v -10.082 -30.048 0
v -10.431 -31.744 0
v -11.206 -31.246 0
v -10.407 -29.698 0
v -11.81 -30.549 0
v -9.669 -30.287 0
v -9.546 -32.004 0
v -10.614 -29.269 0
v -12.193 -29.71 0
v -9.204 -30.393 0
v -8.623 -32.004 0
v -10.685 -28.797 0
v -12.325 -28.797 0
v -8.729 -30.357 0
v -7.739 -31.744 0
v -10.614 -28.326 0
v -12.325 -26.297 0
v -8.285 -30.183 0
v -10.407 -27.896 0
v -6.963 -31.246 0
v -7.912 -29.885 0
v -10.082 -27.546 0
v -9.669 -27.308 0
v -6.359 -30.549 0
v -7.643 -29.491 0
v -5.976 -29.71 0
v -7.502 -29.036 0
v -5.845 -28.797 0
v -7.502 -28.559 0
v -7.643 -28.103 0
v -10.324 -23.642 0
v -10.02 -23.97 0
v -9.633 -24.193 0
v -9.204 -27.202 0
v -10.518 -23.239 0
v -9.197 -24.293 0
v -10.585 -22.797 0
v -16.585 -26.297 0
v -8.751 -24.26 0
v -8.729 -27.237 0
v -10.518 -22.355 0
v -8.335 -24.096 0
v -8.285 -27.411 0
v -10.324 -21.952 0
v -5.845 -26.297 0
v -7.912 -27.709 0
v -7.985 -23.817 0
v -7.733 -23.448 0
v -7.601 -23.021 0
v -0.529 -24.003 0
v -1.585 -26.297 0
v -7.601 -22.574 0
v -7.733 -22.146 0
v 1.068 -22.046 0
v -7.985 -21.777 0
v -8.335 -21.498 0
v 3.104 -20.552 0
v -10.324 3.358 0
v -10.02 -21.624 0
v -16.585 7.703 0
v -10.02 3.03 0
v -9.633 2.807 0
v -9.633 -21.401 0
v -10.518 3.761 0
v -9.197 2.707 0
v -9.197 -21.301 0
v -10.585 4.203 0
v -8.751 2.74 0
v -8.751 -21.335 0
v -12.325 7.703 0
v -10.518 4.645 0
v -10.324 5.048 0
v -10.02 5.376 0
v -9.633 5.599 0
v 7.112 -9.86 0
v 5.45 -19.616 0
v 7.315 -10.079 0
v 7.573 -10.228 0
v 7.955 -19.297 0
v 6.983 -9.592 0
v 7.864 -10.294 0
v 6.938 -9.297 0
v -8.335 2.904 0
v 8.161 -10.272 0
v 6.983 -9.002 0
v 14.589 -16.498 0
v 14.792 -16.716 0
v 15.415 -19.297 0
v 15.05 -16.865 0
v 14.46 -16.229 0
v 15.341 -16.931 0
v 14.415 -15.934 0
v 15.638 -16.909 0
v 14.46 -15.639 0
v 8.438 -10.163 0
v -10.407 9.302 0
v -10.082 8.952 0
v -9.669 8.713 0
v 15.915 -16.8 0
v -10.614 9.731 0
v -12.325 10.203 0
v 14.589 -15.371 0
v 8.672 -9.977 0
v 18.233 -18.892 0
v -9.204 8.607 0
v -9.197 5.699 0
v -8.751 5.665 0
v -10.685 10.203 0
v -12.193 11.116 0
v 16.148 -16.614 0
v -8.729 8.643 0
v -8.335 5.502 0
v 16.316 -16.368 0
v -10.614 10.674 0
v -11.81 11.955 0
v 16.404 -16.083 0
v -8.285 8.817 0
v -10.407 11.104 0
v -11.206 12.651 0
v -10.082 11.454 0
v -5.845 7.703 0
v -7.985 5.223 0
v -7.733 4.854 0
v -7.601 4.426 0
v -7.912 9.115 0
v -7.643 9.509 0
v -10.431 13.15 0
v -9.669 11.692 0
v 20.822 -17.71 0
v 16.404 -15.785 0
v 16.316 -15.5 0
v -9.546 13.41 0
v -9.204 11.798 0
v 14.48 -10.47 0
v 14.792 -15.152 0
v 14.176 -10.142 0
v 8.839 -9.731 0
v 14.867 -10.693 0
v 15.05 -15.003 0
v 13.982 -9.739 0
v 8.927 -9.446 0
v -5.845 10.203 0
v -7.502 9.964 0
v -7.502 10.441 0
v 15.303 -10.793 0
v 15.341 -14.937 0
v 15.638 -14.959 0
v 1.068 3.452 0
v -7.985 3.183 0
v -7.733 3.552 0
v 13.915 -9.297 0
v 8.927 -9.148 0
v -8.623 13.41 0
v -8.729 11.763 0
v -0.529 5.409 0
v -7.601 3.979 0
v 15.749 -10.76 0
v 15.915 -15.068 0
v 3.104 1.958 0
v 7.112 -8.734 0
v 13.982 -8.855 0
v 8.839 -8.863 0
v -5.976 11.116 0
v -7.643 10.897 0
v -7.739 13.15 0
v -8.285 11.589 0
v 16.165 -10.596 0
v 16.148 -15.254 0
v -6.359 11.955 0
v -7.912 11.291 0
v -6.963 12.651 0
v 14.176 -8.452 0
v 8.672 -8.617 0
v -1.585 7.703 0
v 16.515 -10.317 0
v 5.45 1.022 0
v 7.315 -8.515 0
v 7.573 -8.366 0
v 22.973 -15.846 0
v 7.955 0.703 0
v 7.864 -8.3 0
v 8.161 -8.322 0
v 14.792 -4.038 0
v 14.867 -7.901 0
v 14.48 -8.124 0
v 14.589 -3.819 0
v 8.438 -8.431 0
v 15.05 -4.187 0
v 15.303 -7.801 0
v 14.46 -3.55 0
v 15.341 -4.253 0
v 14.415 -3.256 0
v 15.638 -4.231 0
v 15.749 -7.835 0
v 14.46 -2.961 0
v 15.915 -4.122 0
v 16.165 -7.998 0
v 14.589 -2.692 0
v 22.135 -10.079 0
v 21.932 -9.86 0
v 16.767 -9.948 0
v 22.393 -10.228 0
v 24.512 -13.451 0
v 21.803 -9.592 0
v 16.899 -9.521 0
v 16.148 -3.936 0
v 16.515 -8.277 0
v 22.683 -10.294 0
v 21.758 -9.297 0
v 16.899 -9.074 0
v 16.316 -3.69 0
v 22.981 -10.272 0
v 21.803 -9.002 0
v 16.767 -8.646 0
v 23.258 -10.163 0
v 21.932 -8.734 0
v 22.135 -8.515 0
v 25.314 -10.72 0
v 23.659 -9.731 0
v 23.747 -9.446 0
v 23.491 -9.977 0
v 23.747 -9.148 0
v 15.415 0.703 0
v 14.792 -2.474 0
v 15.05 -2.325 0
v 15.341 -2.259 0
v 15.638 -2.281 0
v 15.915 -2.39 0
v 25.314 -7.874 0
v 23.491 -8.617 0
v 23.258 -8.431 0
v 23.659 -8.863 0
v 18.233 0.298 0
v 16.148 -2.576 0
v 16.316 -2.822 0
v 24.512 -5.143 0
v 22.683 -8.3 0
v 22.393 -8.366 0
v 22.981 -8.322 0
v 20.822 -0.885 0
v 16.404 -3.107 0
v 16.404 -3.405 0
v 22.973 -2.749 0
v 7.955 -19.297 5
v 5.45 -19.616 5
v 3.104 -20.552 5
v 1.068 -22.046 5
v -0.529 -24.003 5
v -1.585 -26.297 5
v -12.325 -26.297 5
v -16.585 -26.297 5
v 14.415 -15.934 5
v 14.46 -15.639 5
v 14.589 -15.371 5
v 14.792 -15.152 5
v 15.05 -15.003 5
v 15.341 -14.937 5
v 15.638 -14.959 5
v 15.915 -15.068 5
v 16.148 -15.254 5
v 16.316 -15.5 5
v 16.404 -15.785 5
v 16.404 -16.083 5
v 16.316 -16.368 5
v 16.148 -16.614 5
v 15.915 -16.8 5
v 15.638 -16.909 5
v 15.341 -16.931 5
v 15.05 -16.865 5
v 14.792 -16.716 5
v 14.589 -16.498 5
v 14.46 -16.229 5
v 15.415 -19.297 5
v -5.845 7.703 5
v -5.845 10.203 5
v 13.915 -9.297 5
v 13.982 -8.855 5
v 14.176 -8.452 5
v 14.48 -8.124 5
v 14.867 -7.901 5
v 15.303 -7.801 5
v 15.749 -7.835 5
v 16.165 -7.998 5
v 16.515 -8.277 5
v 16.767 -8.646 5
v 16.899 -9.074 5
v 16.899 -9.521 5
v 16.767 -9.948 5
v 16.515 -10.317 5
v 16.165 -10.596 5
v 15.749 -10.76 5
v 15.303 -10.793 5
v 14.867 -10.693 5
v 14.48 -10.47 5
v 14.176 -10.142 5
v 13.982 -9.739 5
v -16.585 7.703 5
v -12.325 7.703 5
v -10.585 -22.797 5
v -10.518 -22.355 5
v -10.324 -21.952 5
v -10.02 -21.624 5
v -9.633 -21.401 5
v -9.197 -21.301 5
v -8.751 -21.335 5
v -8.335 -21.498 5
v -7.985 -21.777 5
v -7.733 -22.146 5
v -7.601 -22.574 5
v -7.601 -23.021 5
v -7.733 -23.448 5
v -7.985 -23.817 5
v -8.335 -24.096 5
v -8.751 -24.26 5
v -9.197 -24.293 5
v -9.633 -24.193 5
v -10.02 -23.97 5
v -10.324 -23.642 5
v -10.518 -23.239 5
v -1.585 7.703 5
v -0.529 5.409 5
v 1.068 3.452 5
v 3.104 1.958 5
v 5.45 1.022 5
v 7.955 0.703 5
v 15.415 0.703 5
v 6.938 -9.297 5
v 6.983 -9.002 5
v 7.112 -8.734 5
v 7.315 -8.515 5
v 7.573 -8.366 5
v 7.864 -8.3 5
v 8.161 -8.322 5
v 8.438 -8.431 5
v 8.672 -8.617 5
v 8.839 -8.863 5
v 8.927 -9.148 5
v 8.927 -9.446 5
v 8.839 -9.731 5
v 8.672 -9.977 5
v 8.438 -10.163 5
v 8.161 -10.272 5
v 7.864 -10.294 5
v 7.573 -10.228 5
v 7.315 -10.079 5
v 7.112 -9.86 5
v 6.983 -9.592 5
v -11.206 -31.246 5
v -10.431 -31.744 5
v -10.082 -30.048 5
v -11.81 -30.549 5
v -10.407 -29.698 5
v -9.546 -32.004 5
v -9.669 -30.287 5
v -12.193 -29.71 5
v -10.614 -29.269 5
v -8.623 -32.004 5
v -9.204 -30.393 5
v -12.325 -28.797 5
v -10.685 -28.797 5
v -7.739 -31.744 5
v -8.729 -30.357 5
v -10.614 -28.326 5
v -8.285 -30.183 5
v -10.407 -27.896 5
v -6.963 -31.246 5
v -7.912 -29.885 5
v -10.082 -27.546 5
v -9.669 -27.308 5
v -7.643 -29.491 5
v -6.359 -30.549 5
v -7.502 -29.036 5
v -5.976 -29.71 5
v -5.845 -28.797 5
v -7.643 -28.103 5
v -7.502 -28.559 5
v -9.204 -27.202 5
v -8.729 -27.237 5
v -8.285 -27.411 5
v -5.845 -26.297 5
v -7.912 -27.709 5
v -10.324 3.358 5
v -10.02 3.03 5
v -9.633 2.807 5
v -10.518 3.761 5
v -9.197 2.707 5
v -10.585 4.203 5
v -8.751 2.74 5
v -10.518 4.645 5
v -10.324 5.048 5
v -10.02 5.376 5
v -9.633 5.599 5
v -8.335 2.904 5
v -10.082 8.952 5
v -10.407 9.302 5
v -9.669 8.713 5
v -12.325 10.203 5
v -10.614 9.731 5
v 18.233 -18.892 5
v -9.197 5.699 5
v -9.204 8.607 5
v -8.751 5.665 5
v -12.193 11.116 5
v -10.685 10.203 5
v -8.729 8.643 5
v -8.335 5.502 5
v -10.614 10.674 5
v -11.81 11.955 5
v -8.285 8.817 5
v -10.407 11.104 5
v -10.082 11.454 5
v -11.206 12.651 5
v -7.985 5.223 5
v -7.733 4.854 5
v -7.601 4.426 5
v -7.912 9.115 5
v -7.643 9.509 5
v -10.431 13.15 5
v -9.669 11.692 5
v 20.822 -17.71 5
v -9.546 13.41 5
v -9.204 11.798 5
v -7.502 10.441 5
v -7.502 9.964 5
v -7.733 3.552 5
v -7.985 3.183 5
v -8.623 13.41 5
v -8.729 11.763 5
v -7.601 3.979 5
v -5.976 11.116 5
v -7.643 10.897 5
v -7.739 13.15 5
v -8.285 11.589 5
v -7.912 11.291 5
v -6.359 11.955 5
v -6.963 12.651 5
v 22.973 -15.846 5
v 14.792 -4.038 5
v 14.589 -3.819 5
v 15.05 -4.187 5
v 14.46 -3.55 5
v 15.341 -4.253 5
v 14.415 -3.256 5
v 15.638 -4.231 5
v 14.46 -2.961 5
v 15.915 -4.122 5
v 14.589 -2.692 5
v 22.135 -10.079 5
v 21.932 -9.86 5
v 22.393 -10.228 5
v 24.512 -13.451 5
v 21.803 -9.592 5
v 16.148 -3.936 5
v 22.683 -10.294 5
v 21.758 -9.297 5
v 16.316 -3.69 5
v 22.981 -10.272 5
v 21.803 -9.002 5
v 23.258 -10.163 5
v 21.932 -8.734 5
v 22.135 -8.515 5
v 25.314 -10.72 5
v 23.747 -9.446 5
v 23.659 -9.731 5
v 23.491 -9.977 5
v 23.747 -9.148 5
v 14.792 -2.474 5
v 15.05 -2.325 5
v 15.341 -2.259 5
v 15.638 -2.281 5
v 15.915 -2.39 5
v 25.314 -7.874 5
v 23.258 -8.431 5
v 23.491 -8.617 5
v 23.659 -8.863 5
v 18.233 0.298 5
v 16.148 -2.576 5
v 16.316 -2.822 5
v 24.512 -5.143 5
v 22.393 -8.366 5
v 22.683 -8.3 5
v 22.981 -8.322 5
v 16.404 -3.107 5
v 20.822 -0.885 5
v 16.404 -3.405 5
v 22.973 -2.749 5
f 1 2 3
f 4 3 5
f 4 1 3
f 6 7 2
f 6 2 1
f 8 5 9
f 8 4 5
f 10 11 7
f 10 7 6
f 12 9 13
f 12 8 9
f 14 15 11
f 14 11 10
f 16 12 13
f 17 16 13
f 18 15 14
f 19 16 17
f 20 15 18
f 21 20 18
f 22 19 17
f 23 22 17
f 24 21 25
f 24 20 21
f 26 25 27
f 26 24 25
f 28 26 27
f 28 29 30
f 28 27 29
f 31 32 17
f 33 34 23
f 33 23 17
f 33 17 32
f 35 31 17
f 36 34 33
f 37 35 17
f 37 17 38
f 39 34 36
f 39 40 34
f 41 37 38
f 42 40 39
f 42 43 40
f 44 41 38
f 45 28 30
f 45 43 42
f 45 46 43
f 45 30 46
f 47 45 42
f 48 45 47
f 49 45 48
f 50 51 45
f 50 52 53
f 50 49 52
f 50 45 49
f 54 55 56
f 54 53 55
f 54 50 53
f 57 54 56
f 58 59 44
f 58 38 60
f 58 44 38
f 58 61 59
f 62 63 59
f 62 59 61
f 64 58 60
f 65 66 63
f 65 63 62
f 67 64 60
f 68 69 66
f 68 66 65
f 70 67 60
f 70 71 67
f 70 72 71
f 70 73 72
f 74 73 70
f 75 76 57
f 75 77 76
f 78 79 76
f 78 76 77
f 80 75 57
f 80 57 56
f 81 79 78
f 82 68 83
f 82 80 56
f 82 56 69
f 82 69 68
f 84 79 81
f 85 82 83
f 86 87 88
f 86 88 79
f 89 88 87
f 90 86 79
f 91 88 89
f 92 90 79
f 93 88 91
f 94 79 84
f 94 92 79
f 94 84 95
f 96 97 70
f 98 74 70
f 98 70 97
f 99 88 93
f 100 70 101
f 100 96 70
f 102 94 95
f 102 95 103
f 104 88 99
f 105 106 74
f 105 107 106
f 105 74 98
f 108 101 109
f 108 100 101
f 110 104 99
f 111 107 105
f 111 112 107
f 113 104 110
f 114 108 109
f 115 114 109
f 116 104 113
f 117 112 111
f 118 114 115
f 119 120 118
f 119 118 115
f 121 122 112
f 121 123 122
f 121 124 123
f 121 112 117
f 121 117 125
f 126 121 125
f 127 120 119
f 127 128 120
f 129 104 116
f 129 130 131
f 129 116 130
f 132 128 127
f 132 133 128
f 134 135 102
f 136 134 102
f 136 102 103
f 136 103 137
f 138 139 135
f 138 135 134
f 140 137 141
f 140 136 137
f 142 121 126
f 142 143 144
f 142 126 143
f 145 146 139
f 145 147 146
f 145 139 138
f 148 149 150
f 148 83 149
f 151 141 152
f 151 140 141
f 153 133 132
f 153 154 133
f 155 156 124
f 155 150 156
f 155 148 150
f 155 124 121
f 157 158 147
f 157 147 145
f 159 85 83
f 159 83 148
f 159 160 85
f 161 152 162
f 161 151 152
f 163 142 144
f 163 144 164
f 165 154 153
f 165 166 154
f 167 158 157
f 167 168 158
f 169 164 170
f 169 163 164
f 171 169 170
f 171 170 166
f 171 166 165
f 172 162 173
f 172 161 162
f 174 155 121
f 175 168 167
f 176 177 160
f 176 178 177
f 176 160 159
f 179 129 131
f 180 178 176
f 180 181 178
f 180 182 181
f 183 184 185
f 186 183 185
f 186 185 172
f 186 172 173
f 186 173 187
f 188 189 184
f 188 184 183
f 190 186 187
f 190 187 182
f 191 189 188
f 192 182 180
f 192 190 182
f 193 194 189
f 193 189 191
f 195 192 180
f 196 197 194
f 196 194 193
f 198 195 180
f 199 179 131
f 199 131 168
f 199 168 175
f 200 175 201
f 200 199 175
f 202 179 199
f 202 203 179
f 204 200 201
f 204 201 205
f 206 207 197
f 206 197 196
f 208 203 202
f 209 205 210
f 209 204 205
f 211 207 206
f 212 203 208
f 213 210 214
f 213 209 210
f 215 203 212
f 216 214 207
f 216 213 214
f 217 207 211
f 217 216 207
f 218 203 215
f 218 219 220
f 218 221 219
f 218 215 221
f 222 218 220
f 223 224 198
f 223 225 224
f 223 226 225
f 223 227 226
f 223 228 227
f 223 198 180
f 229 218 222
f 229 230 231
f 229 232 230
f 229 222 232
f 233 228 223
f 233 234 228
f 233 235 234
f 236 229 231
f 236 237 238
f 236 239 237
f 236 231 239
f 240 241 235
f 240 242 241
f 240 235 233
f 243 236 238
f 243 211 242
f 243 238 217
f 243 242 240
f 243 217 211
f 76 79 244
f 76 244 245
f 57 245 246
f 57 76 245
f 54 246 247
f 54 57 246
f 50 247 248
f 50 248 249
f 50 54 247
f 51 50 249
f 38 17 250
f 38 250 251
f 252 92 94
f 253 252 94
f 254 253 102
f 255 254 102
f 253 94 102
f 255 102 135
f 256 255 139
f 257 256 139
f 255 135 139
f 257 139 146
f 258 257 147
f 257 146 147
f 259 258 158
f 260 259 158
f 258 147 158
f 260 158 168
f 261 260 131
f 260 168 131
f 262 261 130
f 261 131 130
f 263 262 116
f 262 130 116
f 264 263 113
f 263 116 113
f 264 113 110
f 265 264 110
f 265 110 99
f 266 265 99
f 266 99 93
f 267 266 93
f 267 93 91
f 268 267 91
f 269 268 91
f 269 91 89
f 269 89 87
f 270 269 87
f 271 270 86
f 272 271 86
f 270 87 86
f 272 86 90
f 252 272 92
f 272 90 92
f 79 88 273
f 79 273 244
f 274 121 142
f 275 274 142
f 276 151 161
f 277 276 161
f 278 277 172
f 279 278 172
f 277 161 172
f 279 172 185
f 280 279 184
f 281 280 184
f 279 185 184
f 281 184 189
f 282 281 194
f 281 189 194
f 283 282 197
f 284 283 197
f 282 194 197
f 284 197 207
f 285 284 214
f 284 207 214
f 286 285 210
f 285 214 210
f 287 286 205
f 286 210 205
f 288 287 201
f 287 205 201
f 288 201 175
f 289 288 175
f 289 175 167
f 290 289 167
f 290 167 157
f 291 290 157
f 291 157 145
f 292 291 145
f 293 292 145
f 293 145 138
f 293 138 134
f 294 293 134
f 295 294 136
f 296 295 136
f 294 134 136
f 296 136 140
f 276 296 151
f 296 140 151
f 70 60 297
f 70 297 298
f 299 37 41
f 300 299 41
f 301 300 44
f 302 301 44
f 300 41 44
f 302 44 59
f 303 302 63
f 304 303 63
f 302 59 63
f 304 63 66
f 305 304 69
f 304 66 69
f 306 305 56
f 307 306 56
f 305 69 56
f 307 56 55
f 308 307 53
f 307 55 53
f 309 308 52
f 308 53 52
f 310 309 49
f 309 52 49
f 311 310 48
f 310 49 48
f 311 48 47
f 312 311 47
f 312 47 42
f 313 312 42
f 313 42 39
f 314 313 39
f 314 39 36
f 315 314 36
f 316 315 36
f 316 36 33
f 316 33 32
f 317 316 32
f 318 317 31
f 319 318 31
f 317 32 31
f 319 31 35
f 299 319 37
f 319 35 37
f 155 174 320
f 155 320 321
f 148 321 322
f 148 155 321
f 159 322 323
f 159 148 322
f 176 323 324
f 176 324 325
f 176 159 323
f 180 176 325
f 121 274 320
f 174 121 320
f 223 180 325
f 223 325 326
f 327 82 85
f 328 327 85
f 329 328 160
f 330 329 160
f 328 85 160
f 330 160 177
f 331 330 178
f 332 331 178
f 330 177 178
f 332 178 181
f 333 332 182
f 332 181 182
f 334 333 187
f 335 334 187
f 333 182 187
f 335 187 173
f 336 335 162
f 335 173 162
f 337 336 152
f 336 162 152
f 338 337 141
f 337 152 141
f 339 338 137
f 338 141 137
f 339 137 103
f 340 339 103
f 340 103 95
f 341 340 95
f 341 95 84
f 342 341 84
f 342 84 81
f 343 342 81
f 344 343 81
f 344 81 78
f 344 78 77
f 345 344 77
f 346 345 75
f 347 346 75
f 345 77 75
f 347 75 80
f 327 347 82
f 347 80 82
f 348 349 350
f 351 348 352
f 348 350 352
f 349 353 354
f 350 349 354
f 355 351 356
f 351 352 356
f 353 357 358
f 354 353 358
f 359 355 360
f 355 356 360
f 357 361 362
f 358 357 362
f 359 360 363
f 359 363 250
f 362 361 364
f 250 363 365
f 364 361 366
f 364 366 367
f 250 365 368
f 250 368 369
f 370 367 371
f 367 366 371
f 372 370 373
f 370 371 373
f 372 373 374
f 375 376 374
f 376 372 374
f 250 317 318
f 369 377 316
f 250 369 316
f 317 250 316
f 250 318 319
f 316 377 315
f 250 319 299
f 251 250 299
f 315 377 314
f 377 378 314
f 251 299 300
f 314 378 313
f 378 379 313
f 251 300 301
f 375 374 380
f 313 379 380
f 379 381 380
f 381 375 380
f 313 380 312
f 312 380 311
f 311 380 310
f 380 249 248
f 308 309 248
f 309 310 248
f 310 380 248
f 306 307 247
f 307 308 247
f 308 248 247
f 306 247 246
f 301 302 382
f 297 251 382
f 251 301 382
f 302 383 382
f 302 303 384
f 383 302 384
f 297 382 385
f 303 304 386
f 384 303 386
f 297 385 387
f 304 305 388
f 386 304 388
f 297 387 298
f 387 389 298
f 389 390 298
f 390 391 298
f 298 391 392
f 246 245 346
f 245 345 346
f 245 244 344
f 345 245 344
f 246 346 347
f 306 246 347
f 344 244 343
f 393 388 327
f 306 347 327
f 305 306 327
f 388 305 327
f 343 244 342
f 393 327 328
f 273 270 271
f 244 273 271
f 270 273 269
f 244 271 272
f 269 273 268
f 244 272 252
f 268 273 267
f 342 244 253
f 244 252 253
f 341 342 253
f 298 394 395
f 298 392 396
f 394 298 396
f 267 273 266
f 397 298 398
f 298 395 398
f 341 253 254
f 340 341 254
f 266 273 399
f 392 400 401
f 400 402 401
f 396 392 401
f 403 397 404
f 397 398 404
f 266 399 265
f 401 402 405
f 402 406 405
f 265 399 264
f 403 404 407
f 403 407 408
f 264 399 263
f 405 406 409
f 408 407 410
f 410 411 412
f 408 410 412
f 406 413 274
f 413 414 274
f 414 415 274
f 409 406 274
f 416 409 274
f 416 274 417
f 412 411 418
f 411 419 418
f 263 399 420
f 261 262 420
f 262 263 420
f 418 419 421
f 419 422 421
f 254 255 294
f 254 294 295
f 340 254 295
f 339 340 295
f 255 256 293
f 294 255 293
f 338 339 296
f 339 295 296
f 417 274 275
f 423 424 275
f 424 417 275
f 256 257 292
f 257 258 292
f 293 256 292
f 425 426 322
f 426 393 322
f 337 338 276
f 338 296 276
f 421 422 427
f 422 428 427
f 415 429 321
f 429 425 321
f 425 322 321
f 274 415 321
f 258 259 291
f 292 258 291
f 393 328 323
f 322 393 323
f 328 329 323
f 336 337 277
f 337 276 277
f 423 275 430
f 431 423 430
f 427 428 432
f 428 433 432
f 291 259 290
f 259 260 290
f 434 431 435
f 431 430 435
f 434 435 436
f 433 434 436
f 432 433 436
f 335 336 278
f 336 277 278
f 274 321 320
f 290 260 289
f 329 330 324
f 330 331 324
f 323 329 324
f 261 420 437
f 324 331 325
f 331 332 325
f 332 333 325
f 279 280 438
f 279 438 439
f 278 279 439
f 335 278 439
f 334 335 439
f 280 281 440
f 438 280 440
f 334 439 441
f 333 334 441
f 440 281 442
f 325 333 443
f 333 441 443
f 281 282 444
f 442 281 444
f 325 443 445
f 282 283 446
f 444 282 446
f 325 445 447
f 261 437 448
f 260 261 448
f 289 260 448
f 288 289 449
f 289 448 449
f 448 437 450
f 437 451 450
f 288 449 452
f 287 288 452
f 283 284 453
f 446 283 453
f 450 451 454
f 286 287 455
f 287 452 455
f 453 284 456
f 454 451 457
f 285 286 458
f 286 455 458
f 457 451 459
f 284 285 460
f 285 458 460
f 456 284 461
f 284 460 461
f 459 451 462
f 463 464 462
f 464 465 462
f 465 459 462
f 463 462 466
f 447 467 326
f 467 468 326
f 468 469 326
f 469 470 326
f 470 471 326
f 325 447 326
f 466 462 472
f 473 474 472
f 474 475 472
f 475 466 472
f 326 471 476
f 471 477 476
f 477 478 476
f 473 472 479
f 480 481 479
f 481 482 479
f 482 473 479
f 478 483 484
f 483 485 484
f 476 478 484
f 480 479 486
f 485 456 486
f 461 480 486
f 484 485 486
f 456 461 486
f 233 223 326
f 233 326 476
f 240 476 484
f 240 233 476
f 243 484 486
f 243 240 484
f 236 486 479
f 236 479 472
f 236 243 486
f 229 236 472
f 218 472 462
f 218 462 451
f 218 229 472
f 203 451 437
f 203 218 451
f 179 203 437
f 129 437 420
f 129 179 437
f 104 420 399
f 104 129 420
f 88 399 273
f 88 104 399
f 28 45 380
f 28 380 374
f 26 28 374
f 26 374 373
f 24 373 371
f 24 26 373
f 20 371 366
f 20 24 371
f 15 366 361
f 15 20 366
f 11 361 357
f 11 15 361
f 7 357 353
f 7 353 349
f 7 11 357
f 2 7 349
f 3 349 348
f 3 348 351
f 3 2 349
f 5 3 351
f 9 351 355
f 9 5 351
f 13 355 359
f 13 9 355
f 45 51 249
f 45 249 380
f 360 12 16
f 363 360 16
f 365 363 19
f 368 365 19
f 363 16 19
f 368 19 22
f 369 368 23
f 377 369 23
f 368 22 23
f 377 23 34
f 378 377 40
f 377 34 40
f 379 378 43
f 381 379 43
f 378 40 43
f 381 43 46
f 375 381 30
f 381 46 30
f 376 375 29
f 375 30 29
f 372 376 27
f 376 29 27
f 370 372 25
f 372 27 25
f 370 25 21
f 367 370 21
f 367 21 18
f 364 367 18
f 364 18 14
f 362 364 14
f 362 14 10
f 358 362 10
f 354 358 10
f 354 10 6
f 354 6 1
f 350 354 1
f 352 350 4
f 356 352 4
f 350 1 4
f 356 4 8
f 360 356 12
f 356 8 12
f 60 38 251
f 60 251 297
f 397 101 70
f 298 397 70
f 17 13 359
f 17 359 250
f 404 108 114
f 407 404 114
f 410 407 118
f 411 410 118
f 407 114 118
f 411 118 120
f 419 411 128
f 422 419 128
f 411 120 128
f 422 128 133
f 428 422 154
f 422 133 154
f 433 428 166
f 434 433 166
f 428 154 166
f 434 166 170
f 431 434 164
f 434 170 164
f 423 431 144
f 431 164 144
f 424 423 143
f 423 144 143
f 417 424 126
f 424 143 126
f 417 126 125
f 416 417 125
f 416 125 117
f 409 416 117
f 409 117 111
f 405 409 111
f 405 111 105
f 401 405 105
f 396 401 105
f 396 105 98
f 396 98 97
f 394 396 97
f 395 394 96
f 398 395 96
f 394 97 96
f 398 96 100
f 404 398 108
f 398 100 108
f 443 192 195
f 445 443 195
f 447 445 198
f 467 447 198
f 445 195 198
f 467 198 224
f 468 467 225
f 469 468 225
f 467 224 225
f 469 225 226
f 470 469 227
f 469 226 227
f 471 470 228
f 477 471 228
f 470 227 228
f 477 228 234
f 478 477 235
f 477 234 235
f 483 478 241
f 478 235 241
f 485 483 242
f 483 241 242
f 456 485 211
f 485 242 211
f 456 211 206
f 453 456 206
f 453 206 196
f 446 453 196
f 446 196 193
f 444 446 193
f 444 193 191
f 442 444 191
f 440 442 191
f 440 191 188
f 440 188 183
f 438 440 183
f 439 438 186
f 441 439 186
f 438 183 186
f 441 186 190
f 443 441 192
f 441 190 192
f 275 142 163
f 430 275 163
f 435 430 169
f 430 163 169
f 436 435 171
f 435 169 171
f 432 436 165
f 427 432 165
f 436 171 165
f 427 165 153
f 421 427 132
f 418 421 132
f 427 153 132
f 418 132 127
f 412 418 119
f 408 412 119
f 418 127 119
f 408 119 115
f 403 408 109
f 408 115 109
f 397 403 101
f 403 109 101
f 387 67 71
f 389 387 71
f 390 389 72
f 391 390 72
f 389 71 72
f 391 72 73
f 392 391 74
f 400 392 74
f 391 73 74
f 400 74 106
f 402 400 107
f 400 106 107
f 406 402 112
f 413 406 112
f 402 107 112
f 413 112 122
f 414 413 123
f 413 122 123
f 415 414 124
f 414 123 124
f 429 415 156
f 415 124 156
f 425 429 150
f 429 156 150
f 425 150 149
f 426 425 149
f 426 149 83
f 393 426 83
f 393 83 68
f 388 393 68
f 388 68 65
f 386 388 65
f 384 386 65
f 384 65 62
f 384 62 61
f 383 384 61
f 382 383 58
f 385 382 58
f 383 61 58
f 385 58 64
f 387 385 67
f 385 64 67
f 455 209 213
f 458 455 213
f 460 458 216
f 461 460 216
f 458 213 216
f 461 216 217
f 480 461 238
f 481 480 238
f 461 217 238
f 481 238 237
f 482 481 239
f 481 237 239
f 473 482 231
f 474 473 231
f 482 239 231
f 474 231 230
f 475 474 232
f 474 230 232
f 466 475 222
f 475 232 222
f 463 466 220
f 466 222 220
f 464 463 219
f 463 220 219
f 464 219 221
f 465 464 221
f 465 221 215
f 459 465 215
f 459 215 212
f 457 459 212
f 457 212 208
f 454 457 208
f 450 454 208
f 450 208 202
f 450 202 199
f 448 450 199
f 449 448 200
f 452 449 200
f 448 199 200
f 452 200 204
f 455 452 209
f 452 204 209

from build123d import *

# Parameters (mm, degrees)
ESQUISSE1_R             = 1
ESQUISSE1_R_2           = 1.5
BOSS_EXTRU_1_DEPTH      = 5
ENL_V_MAT_EXTRU_1_DEPTH = 5
ESQUISSE3_W             = 20
ESQUISSE3_H             = 34
BOSS_EXTRU_2_DEPTH      = 5
ESQUISSE4_R             = 1.5
ESQUISSE4_W             = 9.798464728
ESQUISSE4_H             = 39.858161606
ENL_V_MAT_EXTRU_2_DEPTH = 5
ESQUISSE5_W             = 2.5
ESQUISSE5_H             = 34
BOSS_EXTRU_3_DEPTH      = 5
ESQUISSE6_R             = 1.6
BOSS_EXTRU_4_DEPTH      = 5
ESQUISSE8_W             = 43.131619687
ESQUISSE8_H             = 48.78573065
ESQUISSE8_W_2           = 13.204377845
ESQUISSE8_H_2           = 47.447309867
ENL_V_MAT_EXTRU_3_DEPTH = 10
ESQUISSE9_R             = 1.5
ESQUISSE9_R_2           = 1
BOSS_EXTRU_5_DEPTH      = 5
CONG_1_R                = 10


with BuildPart() as part:
    # Esquisse1 → Boss.-Extru.1 (new body)
    with BuildSketch(Plane.XY):
        with BuildLine():
            Line((-13.584596858, -30.047129187), (-13.584596858, -25.547129187))
            Line((-13.584596858, -25.547129187), (-13.584596858, -25.297129187))
            Line((-13.584596858, -25.297129187), (-13.834596858, -25.297129187))
            Line((-13.834596858, -25.297129187), (-16.334596858, -25.297129187))
            Line((-16.334596858, -25.297129187), (-16.584596858, -25.297129187))
            Line((-16.584596858, -25.297129187), (-16.584596858, -25.047129187))
            Line((-16.584596858, -25.047129187), (-16.584596858, 6.452870813))
            Line((-16.584596858, 6.452870813), (-16.584596858, 6.702870813))
            Line((-16.584596858, 6.702870813), (-16.334596858, 6.702870813))
            Line((-16.334596858, 6.702870813), (-13.834596858, 6.702870813))
            Line((-13.834596858, 6.702870813), (-13.584596858, 6.702870813))
            Line((-13.584596858, 6.702870813), (-13.584596858, 6.952870813))
            Line((-13.584596858, 6.952870813), (-13.584596858, 11.452870813))
            Line((-13.584596858, 11.452870813), (-13.584596858, 11.702870813))
            Line((-13.584596858, 11.702870813), (-13.334596858, 11.702870813))
            Line((-13.334596858, 11.702870813), (-8.584596858, 11.702870813))
            Line((-8.584596858, 11.702870813), (-8.584596858, 6.702870813))
            Line((-8.584596858, 6.702870813), (-7.491776281, 6.702870813))
            Line((-7.491776281, 6.702870813), (-4.034541178, 6.702870813))
            ThreePointArc((-4.034541178, 6.702870813), (-0.161557832, 6.19424756), (3.448773595, 4.702870813))
            ThreePointArc((3.448773595, 4.702870813), (10.66943645, 1.720117321), (18.415403142, 0.702870813))
            ThreePointArc((18.415403142, 0.702870813), (28.415403142, -9.297129187), (18.415403142, -19.297129187))
            ThreePointArc((18.415403142, -19.297129187), (10.66943645, -20.314375694), (3.448773595, -23.297129187))
            ThreePointArc((3.448773595, -23.297129187), (-0.161557832, -24.788505933), (-4.034541178, -25.297129187))
            Line((-4.034541178, -25.297129187), (-7.491776281, -25.297129187))
            Line((-7.491776281, -25.297129187), (-8.584596858, -25.297129187))
            Line((-8.584596858, -25.297129187), (-8.584596858, -30.297129187))
            Line((-8.584596858, -30.297129187), (-13.334596858, -30.297129187))
            Line((-13.334596858, -30.297129187), (-13.584596858, -30.297129187))
            Line((-13.584596858, -30.297129187), (-13.584596858, -30.047129187))
        make_face()
        with Locations((18.477857718, -2.297129187)):
            Circle(ESQUISSE1_R, mode=Mode.SUBTRACT)
        with Locations((25.415403142, -9.359583762)):
            Circle(ESQUISSE1_R, mode=Mode.SUBTRACT)
        with Locations((18.415403142, -9.297129187)):
            Circle(ESQUISSE1_R_2, mode=Mode.SUBTRACT)
        with Locations((11.415403142, -9.234674611)):
            Circle(ESQUISSE1_R, mode=Mode.SUBTRACT)
        with Locations((18.352948567, -16.297129187)):
            Circle(ESQUISSE1_R, mode=Mode.SUBTRACT)
    extrude(amount=BOSS_EXTRU_1_DEPTH)

    # Esquisse2 → Enlèv. mat.-Extru.1 (cut)
    with BuildSketch(Plane(origin=(0, 0, 0), x_dir=(-1, 0, 0), z_dir=(0, 0, -1))):
        Polygon((1.584596858, -19.297129187), (1.584596858, -25.297129187), (1.584596858, -26.297129187), (21.584596858, -26.297129187), (21.584596858, -33.65697819), (-26.833247513, -33.65697819), (-26.198667142, -19.297129187), align=None)
        Polygon((21.584596858, 7.702870813), (1.584596858, 7.702870813), (1.584596858, 6.702870813), (1.584596858, 0.702870813), (-26.198667142, 0.702870813), (-26.833247513, 15.062719816), (21.584596858, 15.062719816), align=None)
    extrude(amount=-ENL_V_MAT_EXTRU_1_DEPTH, mode=Mode.SUBTRACT)

    # Esquisse3 → Boss.-Extru.2 (add)
    with BuildSketch(Plane(origin=(0, 0, 0), x_dir=(-1, 0, 0), z_dir=(0, 0, -1))):
        with Locations((11.584596858, -9.297129187)):
            Rectangle(ESQUISSE3_W, ESQUISSE3_H)
    extrude(amount=-BOSS_EXTRU_2_DEPTH)

    # Esquisse4 → Enlèv. mat.-Extru.2 (cut)
    with BuildSketch(Plane(origin=(0, 0, 0), x_dir=(-1, 0, 0), z_dir=(0, 0, -1))):
        with Locations((9.084596858, -22.797129187)):
            Circle(ESQUISSE4_R)
        with Locations((9.084596858, 4.202870813)):
            Circle(ESQUISSE4_R)
        with Locations((23.983829222, -9.020336398)):
            Rectangle(ESQUISSE4_W, ESQUISSE4_H)
    extrude(amount=-ENL_V_MAT_EXTRU_2_DEPTH, mode=Mode.SUBTRACT)

    # Esquisse5 → Boss.-Extru.3 (add)
    with BuildSketch(Plane(origin=(0, 0, 0), x_dir=(-1, 0, 0), z_dir=(0, 0, -1))):
        with Locations((0.334596858, -9.297129187)):
            Rectangle(ESQUISSE5_W, ESQUISSE5_H)
    extrude(amount=-BOSS_EXTRU_3_DEPTH)

    # Esquisse6 → Boss.-Extru.4 (add)
    # profile 1 of 2: a face of its own
    with BuildSketch(Plane(origin=(0, 0, 0), x_dir=(-1, 0, 0), z_dir=(0, 0, -1))):
        with BuildLine():
            Line((12.324596858, -25.12480516), (5.844596858, -25.12480516))
            Line((5.844596858, -25.12480516), (5.844596858, -28.797129187))
            ThreePointArc((5.844596858, -28.797129187), (9.084596858, -32.037129187), (12.324596858, -28.797129187))
            Line((12.324596858, -28.797129187), (12.324596858, -25.12480516))
        make_face()
        with Locations((9.084596858, -28.797129187)):
            Circle(ESQUISSE6_R, mode=Mode.SUBTRACT)
    # profile 2 of 2: a face of its own
    with BuildSketch(Plane(origin=(0, 0, 0), x_dir=(-1, 0, 0), z_dir=(0, 0, -1))):
        with BuildLine():
            Line((12.324596858, 6.757738308), (5.844596858, 6.757738308))
            Line((5.844596858, 6.757738308), (5.844596858, 10.202870813))
            ThreePointArc((5.844596858, 10.202870813), (9.084596858, 13.442870813), (12.324596858, 10.202870813))
            Line((12.324596858, 10.202870813), (12.324596858, 6.757738308))
        make_face()
        with Locations((9.084596858, 10.202870813)):
            Circle(ESQUISSE6_R, mode=Mode.SUBTRACT)
    extrude(amount=-BOSS_EXTRU_4_DEPTH)

    # Esquisse8 → Enlèv. mat.-Extru.3 (cut)
    with BuildSketch(Plane(origin=(0, 0, 0), x_dir=(-1, 0, 0), z_dir=(0, 0, -1))):
        with Locations((-19.981212986, -14.067924119)):
            Rectangle(ESQUISSE8_W, ESQUISSE8_H)
        with Locations((23.186785781, -15.322061454)):
            Rectangle(ESQUISSE8_W_2, ESQUISSE8_H_2)
    extrude(amount=-ENL_V_MAT_EXTRU_3_DEPTH, mode=Mode.SUBTRACT)

    # Esquisse9 → Boss.-Extru.5 (add)
    with BuildSketch(Plane(origin=(0, 0, 0), x_dir=(-1, 0, 0), z_dir=(0, 0, -1))):
        with BuildLine():
            Line((-15.415403142, -19.297129187), (1.584596858, -19.297129187))
            Line((1.584596858, -19.297129187), (1.584596858, 0.702870813))
            Line((1.584596858, 0.702870813), (-15.415403142, 0.702870813))
            ThreePointArc((-15.415403142, 0.702870813), (-25.415403142, -9.297129187), (-15.415403142, -19.297129187))
        make_face()
        with Locations((-15.415403142, -9.297129187)):
            Circle(ESQUISSE9_R, mode=Mode.SUBTRACT)
        with Locations((-15.415403142, -15.934238111)):
            Circle(ESQUISSE9_R_2, mode=Mode.SUBTRACT)
        with Locations((-22.758101932, -9.297129187)):
            Circle(ESQUISSE9_R_2, mode=Mode.SUBTRACT)
        with Locations((-15.415403142, -3.255710211)):
            Circle(ESQUISSE9_R_2, mode=Mode.SUBTRACT)
        with Locations((-7.938498128, -9.297129187)):
            Circle(ESQUISSE9_R_2, mode=Mode.SUBTRACT)
    extrude(amount=-BOSS_EXTRU_5_DEPTH)

    # Congé1
    # the kernel refuses this fillet: 10 mm, written as the material it adds along each edge
    with BuildSketch(Plane(origin=(-1.584596858, 0.702870813, 0), x_dir=(0, 1, 0), z_dir=(0, 0, 1))) as cong_1_piece_1:
        with BuildLine():
            CenterArc((10, -9.539392014), CONG_1_R, 107.457603124, 72.542396876)
            Line((0, -9.539392014), (-0.2, -9.539392014))
            Line((-0.2, -9.539392014), (-0.2, 0))
            Line((-0.2, 0), (0, 0.2))
            ThreePointArc((0, 0.2), (3.5, 0.2), (6.94, 0.19078784))
            Line((6.94, 0.19078784), (7, 0))
        make_face()
    extrude(amount=5)
    with BuildSketch(Plane(origin=(-1.584596858, -19.297129187, 0), x_dir=(0, -1, 0), z_dir=(0, 0, 1))) as cong_1_piece_2:
        with BuildLine():
            CenterArc((10, 9.539392014), CONG_1_R, 180, 72.542396876)
            Line((0, 9.539392014), (-0.2, 9.539392014))
            Line((-0.2, 9.539392014), (-0.2, 0))
            Line((-0.2, 0), (0, -0.2))
            ThreePointArc((0, -0.2), (3.5, -0.2), (6.94, -0.19078784))
            Line((6.94, -0.19078784), (7, 0))
        make_face()
    extrude(amount=5)


solid = part.part
